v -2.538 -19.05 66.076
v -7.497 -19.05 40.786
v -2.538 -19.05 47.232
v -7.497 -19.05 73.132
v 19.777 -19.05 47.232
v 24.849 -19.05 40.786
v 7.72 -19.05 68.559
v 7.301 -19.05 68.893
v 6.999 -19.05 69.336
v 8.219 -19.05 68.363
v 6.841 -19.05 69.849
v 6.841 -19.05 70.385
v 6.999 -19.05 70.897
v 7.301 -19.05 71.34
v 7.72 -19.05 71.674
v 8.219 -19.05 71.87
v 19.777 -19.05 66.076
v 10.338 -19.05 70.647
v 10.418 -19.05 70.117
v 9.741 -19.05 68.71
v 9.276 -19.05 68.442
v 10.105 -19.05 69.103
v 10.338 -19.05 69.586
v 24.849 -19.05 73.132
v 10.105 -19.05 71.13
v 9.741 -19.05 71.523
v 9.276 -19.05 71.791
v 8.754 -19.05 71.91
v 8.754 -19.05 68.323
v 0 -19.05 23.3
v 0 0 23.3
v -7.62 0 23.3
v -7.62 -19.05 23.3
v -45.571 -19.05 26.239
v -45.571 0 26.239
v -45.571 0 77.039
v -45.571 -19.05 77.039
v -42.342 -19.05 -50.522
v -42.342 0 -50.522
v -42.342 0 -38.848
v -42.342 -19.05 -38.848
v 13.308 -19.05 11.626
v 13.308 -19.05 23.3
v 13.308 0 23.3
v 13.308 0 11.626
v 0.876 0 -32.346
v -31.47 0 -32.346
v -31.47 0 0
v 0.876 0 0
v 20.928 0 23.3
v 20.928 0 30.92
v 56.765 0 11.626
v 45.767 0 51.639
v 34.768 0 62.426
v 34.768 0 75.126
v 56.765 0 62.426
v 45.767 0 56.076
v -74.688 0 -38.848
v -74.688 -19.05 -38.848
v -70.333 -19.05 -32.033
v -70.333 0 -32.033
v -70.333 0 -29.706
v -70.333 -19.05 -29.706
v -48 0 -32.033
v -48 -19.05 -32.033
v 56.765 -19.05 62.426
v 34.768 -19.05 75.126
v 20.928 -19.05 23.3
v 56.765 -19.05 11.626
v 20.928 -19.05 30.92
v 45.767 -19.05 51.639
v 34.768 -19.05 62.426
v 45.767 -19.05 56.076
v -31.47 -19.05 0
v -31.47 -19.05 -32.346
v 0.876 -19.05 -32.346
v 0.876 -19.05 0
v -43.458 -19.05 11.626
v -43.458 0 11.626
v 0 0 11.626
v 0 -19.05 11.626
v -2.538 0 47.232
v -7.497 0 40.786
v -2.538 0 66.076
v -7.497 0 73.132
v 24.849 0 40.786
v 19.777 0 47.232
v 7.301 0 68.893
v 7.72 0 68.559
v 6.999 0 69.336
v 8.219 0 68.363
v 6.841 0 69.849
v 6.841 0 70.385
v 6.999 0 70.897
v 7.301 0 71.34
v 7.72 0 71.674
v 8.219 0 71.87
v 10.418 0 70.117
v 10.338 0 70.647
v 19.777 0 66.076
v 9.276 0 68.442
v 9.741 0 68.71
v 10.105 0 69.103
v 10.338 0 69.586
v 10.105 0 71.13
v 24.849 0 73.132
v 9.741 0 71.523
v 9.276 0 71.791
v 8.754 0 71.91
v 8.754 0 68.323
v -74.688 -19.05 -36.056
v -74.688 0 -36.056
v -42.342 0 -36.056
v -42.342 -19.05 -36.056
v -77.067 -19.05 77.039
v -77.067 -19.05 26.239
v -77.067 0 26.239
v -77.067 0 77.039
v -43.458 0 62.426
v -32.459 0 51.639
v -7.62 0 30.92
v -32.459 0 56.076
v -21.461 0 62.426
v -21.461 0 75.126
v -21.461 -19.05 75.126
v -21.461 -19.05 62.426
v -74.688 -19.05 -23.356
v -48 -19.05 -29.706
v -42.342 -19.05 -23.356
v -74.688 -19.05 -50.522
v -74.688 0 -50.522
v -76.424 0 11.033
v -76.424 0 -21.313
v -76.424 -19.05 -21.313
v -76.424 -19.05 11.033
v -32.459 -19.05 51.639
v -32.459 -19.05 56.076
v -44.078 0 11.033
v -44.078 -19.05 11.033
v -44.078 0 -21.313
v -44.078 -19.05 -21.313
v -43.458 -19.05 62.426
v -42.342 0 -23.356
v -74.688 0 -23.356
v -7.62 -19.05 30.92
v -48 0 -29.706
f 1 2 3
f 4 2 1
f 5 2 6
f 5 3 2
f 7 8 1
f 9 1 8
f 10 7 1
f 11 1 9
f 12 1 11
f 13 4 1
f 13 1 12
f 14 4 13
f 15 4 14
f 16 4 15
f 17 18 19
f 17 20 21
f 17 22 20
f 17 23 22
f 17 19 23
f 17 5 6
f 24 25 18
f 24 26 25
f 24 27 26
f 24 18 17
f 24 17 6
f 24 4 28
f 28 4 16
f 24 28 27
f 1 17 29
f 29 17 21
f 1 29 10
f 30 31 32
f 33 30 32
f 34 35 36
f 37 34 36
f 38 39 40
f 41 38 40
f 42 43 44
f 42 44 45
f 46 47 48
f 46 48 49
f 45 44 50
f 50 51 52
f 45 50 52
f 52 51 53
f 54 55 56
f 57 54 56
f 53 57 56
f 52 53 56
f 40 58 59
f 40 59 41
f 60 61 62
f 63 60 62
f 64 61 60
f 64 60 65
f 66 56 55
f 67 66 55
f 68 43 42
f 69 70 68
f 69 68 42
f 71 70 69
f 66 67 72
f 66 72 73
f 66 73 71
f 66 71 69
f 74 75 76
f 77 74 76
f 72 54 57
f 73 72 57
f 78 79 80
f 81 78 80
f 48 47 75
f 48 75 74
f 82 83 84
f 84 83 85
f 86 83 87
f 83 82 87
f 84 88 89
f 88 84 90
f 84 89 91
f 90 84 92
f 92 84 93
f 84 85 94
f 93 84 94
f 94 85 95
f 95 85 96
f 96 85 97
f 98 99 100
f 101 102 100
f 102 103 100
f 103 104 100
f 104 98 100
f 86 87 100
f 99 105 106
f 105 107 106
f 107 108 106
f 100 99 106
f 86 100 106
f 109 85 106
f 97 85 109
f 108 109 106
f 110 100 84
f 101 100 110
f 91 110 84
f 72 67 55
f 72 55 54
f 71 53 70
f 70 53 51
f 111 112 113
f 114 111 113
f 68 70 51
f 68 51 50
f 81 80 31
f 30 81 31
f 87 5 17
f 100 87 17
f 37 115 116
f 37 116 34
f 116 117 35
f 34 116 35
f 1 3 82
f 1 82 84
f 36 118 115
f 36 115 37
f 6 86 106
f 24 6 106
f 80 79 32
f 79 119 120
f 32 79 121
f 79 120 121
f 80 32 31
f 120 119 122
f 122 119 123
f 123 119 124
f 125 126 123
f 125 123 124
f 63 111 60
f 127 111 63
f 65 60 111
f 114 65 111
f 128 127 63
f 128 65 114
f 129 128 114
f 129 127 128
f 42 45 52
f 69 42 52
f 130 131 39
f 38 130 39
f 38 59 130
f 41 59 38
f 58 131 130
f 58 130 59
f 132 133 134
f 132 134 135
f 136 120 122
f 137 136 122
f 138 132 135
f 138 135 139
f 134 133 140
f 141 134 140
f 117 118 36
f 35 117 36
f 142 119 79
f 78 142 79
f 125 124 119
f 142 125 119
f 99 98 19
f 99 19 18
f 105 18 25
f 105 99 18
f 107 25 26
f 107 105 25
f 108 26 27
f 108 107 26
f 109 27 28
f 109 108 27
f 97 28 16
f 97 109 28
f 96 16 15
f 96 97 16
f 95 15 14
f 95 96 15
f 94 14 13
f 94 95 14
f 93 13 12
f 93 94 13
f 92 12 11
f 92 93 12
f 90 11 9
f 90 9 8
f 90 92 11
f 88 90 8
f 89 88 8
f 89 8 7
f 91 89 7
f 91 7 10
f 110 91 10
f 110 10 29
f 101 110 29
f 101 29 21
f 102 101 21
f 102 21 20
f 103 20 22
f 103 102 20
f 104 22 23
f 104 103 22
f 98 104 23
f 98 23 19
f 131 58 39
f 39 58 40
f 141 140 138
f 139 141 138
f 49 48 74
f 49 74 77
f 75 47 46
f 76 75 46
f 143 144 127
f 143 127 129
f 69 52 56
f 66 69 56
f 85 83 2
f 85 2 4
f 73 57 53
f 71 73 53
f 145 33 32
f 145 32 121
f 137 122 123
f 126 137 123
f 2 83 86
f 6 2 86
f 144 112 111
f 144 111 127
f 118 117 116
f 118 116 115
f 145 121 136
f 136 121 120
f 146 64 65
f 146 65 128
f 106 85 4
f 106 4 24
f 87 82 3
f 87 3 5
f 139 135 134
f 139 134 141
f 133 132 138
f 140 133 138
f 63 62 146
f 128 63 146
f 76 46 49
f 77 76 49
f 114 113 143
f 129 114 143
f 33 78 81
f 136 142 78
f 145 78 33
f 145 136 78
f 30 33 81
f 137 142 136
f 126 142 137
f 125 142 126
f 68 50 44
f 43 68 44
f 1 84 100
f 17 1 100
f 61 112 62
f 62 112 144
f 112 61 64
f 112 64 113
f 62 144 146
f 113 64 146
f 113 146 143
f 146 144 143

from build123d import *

# Parameters (mm, degrees)
F0_W     = 31.496
F0_H     = 50.8
F0_W_2   = 32.346091
F0_H_2   = 32.346091
F0_W_3   = 22.314538
F0_H_3   = 18.84339
F0_R     = 1.79868
F0_H_4   = 32.34609
F0_W_4   = 32.34609
F0_H_5   = 12.7
F0_W_5   = 22.332657
F0_H_6   = 2.327877
F0_H_7   = 11.673905
F1_DEPTH = 19.05


with BuildPart() as f1:
    # F0 (on Front) → F1 (new body)
    with BuildSketch(Plane.XZ):
        with Locations((-61.318863, 51.638833)):
            Rectangle(F0_W, F0_H)
        Polygon((-21.460655, 62.425739), (-21.460655, 75.125739), (-43.4577, 62.425739), (-43.4577, 11.625739), (0, 11.625739), (0, 23.299643), (-7.62, 23.299643), (-7.62, 30.919643), (-32.459178, 51.638833), (-32.459178, 56.075739), align=None)
        Polygon((56.76542, 62.425739), (34.768375, 75.125739), (34.768375, 62.425739), (45.766897, 56.075739), (45.766897, 51.638833), (20.927719, 30.919643), (20.927719, 23.299643), (13.307719, 23.299643), (13.307719, 11.625739), (56.76542, 11.625739), align=None)
        with Locations((8.676337, 56.958917)):
            Rectangle(F0_W_2, F0_H_2)
        with Locations((8.619347, 56.653988)):
            Rectangle(F0_W_3, F0_H_3, mode=Mode.SUBTRACT)
        with Locations((8.619347, 70.116587)):
            Circle(F0_R, mode=Mode.SUBTRACT)
        with Locations((-60.250794, -5.139893)):
            Rectangle(F0_W_2, F0_H_4)
        with Locations((-15.296674, -16.173046)):
            Rectangle(F0_W_4, F0_H_2)
        with Locations((-58.515218, -29.705568)):
            Rectangle(F0_W_4, F0_H_5)
        with Locations((-59.166723, -30.869506)):
            Rectangle(F0_W_5, F0_H_6, mode=Mode.SUBTRACT)
        with Locations((-58.515218, -44.684704)):
            Rectangle(F0_W_4, F0_H_7)
    extrude(amount=F1_DEPTH)


solid = f1.part
